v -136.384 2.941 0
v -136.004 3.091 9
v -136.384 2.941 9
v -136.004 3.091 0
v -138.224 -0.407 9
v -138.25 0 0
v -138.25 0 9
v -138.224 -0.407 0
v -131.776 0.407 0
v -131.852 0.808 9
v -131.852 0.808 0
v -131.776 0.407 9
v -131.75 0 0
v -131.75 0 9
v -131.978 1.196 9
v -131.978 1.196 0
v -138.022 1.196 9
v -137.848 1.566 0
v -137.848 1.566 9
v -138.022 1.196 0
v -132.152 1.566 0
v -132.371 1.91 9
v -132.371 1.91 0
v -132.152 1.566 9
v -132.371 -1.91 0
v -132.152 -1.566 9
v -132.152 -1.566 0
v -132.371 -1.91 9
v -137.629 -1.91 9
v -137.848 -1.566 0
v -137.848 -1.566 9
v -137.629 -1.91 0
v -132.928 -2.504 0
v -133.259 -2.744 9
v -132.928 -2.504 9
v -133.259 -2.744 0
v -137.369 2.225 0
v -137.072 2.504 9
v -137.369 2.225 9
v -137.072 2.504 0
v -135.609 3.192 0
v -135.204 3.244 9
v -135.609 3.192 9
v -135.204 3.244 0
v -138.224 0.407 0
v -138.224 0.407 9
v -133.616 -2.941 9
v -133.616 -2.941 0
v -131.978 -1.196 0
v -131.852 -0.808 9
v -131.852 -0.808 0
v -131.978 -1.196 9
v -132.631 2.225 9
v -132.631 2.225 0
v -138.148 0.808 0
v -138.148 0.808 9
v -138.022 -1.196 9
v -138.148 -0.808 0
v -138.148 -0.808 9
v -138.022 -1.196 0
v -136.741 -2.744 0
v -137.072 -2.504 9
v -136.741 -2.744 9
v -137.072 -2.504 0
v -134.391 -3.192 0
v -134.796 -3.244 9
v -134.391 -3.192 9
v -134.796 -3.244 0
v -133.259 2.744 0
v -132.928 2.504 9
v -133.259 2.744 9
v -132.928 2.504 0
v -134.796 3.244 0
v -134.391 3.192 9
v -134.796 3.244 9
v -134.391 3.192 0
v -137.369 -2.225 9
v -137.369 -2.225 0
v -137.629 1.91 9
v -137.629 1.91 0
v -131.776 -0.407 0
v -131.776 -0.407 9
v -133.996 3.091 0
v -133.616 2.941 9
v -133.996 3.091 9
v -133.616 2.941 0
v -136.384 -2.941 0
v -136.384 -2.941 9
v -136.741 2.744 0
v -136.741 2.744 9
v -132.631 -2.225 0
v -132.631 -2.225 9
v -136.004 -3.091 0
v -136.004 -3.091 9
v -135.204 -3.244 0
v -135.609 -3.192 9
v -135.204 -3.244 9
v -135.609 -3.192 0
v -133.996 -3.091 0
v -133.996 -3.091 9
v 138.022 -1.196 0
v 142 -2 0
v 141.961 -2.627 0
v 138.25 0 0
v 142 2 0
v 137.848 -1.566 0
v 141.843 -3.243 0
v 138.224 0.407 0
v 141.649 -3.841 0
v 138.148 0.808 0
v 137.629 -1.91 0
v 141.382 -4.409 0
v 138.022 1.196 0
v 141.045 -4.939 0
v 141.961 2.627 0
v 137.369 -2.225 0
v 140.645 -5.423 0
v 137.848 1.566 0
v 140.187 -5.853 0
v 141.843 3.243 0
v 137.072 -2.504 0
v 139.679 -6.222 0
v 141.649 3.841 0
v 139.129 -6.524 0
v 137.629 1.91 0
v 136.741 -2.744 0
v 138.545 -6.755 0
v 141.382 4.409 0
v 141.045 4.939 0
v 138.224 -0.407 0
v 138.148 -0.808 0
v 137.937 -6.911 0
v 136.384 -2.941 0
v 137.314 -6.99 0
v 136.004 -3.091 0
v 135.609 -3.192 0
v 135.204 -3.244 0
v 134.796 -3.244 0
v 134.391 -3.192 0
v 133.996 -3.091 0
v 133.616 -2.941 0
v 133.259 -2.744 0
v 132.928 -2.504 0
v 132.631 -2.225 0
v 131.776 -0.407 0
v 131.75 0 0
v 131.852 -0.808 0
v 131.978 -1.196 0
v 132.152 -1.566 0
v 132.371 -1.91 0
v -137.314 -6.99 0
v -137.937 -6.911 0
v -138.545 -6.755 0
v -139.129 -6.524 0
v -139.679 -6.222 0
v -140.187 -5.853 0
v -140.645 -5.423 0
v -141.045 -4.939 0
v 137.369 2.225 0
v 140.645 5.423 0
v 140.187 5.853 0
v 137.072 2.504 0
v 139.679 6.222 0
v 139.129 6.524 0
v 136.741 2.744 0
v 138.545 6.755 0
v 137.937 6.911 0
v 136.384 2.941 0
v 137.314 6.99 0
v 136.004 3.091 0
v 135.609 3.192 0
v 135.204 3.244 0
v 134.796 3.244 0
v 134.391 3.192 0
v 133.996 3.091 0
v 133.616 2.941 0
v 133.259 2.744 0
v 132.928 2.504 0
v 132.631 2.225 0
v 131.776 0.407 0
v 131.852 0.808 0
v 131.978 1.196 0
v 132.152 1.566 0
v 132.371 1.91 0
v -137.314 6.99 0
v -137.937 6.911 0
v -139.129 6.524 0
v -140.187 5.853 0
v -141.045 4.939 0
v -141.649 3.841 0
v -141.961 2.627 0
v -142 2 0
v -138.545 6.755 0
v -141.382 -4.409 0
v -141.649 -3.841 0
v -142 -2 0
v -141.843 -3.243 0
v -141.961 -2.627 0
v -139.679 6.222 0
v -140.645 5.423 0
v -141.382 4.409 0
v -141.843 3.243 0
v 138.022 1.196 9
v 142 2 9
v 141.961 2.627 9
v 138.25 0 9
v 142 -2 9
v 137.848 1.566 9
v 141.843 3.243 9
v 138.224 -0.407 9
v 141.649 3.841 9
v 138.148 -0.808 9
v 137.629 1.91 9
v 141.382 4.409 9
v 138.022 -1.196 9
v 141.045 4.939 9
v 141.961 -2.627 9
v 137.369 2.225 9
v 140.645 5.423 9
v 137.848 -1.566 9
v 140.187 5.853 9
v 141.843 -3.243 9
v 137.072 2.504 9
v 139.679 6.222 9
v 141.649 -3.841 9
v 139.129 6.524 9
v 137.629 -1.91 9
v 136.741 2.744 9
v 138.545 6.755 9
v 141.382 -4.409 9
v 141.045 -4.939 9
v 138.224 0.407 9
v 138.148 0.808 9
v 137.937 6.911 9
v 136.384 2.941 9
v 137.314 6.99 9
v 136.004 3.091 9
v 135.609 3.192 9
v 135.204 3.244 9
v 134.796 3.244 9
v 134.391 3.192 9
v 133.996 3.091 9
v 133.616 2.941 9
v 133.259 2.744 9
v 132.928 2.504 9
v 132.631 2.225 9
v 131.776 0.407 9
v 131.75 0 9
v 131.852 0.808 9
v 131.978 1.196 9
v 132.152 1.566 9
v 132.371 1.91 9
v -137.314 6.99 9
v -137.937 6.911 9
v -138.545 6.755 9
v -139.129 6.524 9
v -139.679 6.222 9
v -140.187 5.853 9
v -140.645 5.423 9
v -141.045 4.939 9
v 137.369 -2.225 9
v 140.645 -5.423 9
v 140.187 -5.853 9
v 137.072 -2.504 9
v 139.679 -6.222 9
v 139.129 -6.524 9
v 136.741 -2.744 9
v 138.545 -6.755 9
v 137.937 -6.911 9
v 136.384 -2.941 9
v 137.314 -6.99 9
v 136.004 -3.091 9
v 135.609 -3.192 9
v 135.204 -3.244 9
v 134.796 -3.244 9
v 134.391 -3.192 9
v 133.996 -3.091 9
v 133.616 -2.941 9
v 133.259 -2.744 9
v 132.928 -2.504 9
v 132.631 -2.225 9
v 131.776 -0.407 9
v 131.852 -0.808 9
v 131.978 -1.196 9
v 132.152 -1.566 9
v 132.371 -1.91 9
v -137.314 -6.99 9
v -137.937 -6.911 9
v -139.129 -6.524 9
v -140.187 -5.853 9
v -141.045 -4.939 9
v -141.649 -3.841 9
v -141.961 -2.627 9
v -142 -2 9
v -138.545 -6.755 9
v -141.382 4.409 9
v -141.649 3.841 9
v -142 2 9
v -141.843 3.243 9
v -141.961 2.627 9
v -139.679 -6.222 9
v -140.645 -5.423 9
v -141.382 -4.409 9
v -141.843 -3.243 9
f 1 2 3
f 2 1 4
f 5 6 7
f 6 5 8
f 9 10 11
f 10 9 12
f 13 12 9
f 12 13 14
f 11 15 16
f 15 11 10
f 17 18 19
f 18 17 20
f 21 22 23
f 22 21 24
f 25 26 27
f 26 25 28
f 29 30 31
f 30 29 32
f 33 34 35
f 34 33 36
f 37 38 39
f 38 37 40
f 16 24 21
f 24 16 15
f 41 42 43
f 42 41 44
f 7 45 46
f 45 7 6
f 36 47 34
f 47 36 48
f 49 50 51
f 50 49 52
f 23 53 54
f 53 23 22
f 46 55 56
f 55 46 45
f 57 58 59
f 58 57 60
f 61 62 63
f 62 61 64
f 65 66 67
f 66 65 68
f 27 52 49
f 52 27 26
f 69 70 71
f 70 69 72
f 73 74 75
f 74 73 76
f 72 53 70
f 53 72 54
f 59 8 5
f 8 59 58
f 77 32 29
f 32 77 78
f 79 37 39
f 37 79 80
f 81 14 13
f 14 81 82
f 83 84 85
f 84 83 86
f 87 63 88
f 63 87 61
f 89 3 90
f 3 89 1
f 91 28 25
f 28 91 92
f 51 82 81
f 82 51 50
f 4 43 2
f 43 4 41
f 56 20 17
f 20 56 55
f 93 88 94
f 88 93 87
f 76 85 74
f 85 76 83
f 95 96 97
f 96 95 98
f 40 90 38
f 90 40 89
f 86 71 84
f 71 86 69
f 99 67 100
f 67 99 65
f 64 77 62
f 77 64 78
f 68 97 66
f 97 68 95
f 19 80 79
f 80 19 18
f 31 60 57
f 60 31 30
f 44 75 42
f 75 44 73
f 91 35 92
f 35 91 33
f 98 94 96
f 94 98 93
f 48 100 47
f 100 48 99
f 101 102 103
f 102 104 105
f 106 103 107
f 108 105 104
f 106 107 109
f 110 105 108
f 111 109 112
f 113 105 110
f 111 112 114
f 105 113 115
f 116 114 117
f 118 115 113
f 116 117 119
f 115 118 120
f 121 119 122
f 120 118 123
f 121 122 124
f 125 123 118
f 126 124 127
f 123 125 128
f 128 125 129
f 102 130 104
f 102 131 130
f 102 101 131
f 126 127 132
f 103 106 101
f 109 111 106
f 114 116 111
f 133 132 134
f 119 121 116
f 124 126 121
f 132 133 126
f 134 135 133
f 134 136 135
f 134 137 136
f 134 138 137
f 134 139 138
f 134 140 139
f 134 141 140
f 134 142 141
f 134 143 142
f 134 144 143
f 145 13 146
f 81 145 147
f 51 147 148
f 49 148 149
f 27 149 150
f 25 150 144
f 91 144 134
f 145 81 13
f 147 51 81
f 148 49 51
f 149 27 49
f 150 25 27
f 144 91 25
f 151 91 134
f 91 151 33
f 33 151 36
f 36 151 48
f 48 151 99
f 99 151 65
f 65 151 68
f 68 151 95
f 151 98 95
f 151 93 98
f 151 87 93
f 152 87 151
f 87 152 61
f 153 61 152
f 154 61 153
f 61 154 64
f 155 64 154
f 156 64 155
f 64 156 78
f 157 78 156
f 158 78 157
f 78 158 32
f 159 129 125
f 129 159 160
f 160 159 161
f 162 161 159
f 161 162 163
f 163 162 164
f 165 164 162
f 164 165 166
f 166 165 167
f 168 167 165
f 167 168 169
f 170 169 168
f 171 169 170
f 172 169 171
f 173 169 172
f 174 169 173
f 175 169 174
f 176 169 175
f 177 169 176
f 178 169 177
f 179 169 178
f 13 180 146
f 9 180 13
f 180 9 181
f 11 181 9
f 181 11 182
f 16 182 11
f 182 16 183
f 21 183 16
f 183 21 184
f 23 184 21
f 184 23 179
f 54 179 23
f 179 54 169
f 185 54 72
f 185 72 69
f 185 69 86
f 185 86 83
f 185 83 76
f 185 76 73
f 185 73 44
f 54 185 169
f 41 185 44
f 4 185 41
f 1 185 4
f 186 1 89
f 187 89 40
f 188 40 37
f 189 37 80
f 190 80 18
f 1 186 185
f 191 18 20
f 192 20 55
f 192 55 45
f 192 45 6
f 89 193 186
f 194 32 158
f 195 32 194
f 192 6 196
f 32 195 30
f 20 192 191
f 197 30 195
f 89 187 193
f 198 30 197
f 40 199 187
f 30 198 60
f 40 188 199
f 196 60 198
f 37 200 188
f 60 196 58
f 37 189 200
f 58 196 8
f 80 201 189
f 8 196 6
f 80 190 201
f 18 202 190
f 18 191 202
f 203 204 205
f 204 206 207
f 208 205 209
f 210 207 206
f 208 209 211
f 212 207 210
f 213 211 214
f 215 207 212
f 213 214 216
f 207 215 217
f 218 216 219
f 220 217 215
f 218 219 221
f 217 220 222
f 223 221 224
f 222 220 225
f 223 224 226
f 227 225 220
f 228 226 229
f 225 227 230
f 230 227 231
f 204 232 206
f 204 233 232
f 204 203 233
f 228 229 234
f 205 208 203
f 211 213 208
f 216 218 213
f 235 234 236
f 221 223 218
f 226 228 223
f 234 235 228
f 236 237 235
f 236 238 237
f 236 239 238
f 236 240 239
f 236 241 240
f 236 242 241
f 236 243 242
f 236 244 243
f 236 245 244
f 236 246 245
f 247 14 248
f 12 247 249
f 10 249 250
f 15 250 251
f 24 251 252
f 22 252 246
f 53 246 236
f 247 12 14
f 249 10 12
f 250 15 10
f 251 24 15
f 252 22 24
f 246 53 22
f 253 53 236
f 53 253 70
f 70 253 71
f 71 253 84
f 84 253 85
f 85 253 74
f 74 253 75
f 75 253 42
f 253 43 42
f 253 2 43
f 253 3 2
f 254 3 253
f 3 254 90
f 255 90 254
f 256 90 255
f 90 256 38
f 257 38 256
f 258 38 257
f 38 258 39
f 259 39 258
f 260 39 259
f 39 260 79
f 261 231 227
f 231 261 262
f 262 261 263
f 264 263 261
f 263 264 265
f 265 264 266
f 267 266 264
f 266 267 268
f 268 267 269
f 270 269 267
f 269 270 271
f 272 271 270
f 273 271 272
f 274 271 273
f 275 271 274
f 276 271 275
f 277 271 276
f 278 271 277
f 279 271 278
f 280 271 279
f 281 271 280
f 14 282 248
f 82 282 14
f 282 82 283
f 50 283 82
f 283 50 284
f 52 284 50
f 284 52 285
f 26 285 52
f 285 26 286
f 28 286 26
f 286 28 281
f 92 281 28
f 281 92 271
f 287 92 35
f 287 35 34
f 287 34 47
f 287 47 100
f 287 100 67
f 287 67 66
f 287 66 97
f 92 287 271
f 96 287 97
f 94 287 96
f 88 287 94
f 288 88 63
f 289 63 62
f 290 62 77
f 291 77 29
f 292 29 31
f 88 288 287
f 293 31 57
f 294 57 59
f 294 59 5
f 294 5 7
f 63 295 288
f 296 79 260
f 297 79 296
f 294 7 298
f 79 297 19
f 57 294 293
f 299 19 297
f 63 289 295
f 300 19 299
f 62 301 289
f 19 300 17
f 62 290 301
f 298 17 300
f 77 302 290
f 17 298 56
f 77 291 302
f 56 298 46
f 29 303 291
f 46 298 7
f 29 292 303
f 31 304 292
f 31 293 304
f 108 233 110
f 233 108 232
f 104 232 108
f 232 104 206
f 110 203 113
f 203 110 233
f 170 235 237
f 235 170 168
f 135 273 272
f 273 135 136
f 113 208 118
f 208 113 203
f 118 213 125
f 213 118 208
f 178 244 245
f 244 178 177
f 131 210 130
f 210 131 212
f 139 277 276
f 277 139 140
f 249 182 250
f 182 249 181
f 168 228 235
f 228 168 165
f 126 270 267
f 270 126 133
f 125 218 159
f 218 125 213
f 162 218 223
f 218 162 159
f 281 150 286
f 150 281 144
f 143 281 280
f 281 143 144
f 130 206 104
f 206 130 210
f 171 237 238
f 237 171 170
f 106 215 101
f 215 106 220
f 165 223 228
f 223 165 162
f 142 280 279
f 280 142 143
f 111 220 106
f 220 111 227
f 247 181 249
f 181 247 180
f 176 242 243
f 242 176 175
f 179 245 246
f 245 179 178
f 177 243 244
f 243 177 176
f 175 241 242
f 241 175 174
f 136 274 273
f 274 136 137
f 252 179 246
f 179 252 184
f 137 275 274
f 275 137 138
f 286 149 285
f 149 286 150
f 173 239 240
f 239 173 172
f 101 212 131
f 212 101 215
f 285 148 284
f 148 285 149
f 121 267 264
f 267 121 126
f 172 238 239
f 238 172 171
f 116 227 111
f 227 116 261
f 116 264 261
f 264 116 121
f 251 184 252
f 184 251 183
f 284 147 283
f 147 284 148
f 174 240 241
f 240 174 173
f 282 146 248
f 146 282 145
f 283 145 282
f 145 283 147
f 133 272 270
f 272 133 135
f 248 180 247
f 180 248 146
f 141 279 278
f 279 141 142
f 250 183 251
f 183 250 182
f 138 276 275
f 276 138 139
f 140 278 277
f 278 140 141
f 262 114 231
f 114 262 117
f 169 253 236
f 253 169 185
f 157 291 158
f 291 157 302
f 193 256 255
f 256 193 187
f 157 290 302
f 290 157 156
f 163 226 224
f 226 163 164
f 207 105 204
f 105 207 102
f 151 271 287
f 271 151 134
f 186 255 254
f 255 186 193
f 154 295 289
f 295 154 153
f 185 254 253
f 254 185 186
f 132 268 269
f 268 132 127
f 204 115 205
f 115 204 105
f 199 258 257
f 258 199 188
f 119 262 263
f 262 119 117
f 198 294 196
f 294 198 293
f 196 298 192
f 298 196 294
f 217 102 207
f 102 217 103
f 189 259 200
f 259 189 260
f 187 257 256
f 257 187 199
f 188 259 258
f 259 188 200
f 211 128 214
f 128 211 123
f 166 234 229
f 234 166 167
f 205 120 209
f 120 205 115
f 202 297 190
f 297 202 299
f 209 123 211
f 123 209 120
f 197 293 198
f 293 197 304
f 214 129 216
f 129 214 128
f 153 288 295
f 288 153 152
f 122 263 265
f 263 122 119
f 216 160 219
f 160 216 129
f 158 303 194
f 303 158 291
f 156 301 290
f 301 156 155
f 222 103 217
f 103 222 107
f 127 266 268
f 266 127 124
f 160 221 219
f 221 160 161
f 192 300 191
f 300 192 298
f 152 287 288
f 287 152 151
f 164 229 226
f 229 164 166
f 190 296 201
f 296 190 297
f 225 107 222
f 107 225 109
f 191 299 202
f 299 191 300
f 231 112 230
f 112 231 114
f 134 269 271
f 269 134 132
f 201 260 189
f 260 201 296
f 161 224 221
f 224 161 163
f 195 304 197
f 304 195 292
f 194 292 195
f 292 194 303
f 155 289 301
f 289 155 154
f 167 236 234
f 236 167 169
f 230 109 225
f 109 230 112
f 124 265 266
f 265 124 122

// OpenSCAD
$fn = 50;


difference() {
	union() {
		hull() {
			translate(v = [-137.0000000000, 2.0000000000, 0]) {
				cylinder(h = 9, r = 5);
			}
			translate(v = [137.0000000000, 2.0000000000, 0]) {
				cylinder(h = 9, r = 5);
			}
			translate(v = [-137.0000000000, -2.0000000000, 0]) {
				cylinder(h = 9, r = 5);
			}
			translate(v = [137.0000000000, -2.0000000000, 0]) {
				cylinder(h = 9, r = 5);
			}
		}
	}
	union() {
		translate(v = [-135.0000000000, 0.0000000000, 0]) {
			cylinder(h = 9, r = 3.2500000000);
		}
		translate(v = [135.0000000000, 0.0000000000, 0]) {
			cylinder(h = 9, r = 3.2500000000);
		}
		translate(v = [-135.0000000000, 0.0000000000, 0]) {
			cylinder(h = 9, r = 1.8000000000);
		}
		translate(v = [135.0000000000, 0.0000000000, 0]) {
			cylinder(h = 9, r = 1.8000000000);
		}
		translate(v = [-135.0000000000, 0.0000000000, 0]) {
			cylinder(h = 9, r = 1.8000000000);
		}
		translate(v = [135.0000000000, 0.0000000000, 0]) {
			cylinder(h = 9, r = 1.8000000000);
		}
		translate(v = [-135.0000000000, 0.0000000000, 0]) {
			cylinder(h = 9, r = 1.8000000000);
		}
		translate(v = [135.0000000000, 0.0000000000, 0]) {
			cylinder(h = 9, r = 1.8000000000);
		}
	}
}
